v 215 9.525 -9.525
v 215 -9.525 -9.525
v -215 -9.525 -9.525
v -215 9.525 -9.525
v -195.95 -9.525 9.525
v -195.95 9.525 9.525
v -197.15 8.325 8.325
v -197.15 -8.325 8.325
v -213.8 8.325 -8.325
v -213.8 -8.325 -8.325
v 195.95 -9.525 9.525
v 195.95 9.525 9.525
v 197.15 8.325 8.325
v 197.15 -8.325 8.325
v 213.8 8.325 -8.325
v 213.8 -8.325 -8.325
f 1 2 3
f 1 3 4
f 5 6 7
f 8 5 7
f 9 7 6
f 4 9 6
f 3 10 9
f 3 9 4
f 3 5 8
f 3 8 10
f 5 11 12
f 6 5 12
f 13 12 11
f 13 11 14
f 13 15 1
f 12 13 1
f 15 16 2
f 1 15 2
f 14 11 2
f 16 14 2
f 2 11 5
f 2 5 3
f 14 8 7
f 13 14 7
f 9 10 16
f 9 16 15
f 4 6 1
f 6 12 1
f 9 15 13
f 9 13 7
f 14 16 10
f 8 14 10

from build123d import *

# Parameters (mm, degrees)
SKETCH1_W               = 19.05
SKETCH1_H               = 19.05
BOSS_EXTRUDE1_DEPTH     = 215
SKETCH2_W               = 16.65
SKETCH2_H               = 16.65
CUT_EXTRUDE1_DEPTH      = 431.210938087
CUT_EXTRUDE2_DEPTH      = 216.421566353
CUT_EXTRUDE2_DEPTH_BACK = 216.421566353


with BuildPart() as part:
    # Sketch1 → Boss-Extrude1 (new, symmetric)
    with BuildSketch(Plane(origin=(0, 0, 0), x_dir=(0, 0, -1), z_dir=(1, 0, 0))):
        Rectangle(SKETCH1_W, SKETCH1_H)
    extrude(amount=BOSS_EXTRUDE1_DEPTH, both=True)

    # Sketch2 → Cut-Extrude1 (cut, through all)
    with BuildSketch(Plane.ZY.offset(215)):
        Rectangle(SKETCH2_W, SKETCH2_H)
    extrude(amount=-CUT_EXTRUDE1_DEPTH, mode=Mode.SUBTRACT)

    # Sketch3 → Cut-Extrude2 (cut, two sides: drawn at the far end of the back side and taken through both)
    with BuildSketch(Plane(origin=(0, 0, 0), x_dir=(1, 0, 0), z_dir=(0, 1, 0)).offset(-CUT_EXTRUDE2_DEPTH_BACK)):
        Polygon((-215, 9.525), (-215, -9.525), (-195.95, -9.525), align=None)
        Polygon((215, -9.525), (195.95, -9.525), (215, 9.525), align=None)
    extrude(amount=CUT_EXTRUDE2_DEPTH + CUT_EXTRUDE2_DEPTH_BACK, mode=Mode.SUBTRACT)


solid = part.part
